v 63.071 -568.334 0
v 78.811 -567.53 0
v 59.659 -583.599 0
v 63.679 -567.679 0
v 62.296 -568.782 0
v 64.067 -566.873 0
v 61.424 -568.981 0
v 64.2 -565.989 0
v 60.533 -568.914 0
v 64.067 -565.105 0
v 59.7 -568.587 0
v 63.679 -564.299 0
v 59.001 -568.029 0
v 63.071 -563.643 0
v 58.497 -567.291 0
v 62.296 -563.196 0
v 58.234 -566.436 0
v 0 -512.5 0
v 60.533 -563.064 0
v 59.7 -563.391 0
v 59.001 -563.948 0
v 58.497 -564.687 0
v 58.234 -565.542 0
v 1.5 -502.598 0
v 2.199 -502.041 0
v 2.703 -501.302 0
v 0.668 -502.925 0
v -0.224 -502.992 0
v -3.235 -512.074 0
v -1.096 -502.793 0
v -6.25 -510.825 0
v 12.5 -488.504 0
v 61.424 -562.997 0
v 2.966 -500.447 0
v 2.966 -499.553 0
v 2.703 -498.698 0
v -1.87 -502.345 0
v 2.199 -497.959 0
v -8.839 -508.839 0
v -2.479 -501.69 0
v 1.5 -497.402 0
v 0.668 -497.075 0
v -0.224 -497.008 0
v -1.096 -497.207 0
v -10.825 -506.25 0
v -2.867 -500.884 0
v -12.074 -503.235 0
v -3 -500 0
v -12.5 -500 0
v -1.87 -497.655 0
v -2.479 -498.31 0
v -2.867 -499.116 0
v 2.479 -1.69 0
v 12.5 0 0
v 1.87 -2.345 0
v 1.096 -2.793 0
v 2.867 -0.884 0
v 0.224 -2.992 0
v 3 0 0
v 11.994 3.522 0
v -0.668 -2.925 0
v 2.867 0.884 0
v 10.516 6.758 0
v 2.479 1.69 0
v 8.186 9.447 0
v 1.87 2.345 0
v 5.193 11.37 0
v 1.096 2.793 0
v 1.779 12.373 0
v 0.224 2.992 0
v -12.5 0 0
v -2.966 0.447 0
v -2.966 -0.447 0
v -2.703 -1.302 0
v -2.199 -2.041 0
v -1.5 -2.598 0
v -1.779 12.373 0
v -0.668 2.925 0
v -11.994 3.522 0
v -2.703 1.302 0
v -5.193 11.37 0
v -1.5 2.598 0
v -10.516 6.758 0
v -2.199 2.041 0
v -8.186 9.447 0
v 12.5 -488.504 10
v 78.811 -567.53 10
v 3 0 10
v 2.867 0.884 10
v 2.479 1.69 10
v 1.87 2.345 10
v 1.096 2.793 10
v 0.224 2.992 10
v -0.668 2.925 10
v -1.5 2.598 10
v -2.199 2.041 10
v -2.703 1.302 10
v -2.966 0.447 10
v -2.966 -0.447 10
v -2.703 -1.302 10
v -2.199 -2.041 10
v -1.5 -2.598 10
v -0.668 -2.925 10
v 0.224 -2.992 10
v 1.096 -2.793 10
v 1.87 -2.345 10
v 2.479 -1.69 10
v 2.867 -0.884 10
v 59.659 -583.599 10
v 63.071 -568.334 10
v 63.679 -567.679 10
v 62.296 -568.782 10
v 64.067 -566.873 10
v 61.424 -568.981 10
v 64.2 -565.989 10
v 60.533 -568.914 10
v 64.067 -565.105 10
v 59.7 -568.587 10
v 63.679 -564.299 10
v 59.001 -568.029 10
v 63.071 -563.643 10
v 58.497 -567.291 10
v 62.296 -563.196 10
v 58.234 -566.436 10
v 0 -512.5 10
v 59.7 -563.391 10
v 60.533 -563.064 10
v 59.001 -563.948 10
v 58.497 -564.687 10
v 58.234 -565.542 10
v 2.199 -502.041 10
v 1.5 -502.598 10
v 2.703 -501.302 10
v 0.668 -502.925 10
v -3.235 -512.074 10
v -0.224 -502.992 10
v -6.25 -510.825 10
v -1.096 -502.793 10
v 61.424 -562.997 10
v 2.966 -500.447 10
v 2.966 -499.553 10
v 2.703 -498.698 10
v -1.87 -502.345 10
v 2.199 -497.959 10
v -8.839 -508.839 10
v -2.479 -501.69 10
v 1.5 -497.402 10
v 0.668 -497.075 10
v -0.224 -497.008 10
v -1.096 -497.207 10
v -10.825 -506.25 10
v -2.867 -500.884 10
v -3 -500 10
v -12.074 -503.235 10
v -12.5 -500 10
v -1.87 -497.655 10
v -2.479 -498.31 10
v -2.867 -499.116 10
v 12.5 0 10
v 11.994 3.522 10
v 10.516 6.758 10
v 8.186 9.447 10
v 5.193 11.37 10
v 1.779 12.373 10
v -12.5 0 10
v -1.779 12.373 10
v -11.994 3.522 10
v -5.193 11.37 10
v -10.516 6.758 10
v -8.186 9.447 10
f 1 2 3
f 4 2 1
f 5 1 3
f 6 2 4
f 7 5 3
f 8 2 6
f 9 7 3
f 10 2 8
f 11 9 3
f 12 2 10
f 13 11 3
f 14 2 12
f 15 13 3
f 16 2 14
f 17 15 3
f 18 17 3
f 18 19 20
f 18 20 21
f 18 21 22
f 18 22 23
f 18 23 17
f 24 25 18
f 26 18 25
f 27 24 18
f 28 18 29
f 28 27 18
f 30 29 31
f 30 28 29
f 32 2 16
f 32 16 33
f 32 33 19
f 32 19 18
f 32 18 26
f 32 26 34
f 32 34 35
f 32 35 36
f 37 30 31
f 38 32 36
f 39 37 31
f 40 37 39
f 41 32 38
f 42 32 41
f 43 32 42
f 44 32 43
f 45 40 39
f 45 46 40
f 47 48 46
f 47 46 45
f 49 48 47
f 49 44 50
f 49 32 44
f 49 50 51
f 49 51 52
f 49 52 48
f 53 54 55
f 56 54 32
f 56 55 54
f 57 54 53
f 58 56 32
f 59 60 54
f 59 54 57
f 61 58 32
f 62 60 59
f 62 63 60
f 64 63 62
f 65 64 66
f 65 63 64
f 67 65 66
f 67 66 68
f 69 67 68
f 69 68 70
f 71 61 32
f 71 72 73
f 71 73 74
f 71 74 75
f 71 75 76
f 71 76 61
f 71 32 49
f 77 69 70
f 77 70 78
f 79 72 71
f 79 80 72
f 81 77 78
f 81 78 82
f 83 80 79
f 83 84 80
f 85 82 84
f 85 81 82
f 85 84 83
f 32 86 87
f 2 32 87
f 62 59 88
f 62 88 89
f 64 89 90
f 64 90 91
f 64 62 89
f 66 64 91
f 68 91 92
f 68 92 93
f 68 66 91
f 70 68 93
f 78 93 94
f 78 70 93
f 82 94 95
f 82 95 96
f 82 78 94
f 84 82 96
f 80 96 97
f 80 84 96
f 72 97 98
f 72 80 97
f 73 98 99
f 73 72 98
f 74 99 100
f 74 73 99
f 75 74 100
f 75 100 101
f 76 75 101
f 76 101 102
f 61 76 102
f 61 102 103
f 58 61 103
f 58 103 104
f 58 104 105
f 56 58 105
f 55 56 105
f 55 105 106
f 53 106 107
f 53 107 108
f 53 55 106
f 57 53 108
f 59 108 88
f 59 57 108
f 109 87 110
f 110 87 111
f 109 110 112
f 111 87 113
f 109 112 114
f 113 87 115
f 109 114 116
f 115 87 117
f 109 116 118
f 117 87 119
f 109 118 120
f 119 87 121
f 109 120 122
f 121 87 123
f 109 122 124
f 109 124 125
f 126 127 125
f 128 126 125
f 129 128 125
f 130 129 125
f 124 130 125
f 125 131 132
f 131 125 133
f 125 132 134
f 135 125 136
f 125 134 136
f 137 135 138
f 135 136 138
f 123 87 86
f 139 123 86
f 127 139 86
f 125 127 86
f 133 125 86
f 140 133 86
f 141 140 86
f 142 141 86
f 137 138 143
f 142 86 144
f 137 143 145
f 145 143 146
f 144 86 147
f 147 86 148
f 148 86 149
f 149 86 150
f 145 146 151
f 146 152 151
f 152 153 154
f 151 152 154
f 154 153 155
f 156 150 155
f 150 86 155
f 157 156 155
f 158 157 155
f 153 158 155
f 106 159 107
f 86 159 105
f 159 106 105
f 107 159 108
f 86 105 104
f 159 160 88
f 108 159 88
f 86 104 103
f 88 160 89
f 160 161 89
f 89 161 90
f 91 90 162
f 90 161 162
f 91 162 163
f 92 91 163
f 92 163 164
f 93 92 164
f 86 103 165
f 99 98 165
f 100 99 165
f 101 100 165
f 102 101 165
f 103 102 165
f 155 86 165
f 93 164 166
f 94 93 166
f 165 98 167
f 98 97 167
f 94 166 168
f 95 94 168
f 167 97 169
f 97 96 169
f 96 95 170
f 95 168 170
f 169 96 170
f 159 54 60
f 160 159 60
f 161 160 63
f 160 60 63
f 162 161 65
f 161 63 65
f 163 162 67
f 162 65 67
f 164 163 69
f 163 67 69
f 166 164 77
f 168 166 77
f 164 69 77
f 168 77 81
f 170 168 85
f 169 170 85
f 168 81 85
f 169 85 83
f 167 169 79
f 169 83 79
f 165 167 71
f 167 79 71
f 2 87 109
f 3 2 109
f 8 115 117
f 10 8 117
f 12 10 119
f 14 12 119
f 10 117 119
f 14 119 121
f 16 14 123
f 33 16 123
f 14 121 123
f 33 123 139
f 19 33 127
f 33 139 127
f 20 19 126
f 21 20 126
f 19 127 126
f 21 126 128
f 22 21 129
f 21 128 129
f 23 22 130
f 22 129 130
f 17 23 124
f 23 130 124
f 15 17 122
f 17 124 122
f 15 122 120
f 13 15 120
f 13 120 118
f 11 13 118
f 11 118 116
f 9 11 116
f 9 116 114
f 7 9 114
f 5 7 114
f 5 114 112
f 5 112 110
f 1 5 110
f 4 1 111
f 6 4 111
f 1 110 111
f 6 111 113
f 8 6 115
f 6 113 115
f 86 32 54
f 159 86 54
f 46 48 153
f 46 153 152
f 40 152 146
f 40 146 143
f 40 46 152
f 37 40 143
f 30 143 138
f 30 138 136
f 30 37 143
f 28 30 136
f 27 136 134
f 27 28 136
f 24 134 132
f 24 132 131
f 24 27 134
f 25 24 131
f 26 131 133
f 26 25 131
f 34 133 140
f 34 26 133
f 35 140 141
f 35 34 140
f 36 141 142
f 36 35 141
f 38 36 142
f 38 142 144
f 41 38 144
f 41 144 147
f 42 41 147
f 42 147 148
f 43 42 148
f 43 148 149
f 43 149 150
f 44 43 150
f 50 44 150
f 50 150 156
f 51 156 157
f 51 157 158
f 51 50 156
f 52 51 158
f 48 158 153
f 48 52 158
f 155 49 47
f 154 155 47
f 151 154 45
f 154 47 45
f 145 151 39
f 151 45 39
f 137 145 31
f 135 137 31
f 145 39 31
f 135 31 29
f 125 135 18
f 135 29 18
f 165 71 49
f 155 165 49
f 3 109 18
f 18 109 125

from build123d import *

# Parameters (mm, degrees)
SKETCH1_R           = 3
BOSS_EXTRUDE1_DEPTH = 10
SKETCH2_R           = 3
BOSS_EXTRUDE3_DEPTH = 10


with BuildPart() as part:
    # Sketch1 → Boss-Extrude1 (new body)
    with BuildSketch(Plane.XY):
        with BuildLine():
            Line((-12.5, 0), (-12.5, -500))
            ThreePointArc((-12.5, -500), (0, -512.5), (12.5, -500))
            Line((12.5, -500), (12.5, 0))
            ThreePointArc((12.5, 0), (0, 12.5), (-12.5, 0))
        make_face()
        Circle(SKETCH1_R, mode=Mode.SUBTRACT)
        with Locations(Location((0, -500, 0), (0, 0, 180))):
            Circle(SKETCH1_R, mode=Mode.SUBTRACT)
    extrude(amount=BOSS_EXTRUDE1_DEPTH)

    # Sketch2 → Boss-Extrude3 (add)
    with BuildSketch(Plane.XY.offset(10)):
        Polygon((12.5, -488.503824236), (78.810550707, -567.529661268), (59.659439629, -583.59935151), (0, -512.5), align=None)
        with Locations((61.200150047, -565.98895085)):
            Circle(SKETCH2_R, mode=Mode.SUBTRACT)
    extrude(amount=-BOSS_EXTRUDE3_DEPTH)


solid = part.part
